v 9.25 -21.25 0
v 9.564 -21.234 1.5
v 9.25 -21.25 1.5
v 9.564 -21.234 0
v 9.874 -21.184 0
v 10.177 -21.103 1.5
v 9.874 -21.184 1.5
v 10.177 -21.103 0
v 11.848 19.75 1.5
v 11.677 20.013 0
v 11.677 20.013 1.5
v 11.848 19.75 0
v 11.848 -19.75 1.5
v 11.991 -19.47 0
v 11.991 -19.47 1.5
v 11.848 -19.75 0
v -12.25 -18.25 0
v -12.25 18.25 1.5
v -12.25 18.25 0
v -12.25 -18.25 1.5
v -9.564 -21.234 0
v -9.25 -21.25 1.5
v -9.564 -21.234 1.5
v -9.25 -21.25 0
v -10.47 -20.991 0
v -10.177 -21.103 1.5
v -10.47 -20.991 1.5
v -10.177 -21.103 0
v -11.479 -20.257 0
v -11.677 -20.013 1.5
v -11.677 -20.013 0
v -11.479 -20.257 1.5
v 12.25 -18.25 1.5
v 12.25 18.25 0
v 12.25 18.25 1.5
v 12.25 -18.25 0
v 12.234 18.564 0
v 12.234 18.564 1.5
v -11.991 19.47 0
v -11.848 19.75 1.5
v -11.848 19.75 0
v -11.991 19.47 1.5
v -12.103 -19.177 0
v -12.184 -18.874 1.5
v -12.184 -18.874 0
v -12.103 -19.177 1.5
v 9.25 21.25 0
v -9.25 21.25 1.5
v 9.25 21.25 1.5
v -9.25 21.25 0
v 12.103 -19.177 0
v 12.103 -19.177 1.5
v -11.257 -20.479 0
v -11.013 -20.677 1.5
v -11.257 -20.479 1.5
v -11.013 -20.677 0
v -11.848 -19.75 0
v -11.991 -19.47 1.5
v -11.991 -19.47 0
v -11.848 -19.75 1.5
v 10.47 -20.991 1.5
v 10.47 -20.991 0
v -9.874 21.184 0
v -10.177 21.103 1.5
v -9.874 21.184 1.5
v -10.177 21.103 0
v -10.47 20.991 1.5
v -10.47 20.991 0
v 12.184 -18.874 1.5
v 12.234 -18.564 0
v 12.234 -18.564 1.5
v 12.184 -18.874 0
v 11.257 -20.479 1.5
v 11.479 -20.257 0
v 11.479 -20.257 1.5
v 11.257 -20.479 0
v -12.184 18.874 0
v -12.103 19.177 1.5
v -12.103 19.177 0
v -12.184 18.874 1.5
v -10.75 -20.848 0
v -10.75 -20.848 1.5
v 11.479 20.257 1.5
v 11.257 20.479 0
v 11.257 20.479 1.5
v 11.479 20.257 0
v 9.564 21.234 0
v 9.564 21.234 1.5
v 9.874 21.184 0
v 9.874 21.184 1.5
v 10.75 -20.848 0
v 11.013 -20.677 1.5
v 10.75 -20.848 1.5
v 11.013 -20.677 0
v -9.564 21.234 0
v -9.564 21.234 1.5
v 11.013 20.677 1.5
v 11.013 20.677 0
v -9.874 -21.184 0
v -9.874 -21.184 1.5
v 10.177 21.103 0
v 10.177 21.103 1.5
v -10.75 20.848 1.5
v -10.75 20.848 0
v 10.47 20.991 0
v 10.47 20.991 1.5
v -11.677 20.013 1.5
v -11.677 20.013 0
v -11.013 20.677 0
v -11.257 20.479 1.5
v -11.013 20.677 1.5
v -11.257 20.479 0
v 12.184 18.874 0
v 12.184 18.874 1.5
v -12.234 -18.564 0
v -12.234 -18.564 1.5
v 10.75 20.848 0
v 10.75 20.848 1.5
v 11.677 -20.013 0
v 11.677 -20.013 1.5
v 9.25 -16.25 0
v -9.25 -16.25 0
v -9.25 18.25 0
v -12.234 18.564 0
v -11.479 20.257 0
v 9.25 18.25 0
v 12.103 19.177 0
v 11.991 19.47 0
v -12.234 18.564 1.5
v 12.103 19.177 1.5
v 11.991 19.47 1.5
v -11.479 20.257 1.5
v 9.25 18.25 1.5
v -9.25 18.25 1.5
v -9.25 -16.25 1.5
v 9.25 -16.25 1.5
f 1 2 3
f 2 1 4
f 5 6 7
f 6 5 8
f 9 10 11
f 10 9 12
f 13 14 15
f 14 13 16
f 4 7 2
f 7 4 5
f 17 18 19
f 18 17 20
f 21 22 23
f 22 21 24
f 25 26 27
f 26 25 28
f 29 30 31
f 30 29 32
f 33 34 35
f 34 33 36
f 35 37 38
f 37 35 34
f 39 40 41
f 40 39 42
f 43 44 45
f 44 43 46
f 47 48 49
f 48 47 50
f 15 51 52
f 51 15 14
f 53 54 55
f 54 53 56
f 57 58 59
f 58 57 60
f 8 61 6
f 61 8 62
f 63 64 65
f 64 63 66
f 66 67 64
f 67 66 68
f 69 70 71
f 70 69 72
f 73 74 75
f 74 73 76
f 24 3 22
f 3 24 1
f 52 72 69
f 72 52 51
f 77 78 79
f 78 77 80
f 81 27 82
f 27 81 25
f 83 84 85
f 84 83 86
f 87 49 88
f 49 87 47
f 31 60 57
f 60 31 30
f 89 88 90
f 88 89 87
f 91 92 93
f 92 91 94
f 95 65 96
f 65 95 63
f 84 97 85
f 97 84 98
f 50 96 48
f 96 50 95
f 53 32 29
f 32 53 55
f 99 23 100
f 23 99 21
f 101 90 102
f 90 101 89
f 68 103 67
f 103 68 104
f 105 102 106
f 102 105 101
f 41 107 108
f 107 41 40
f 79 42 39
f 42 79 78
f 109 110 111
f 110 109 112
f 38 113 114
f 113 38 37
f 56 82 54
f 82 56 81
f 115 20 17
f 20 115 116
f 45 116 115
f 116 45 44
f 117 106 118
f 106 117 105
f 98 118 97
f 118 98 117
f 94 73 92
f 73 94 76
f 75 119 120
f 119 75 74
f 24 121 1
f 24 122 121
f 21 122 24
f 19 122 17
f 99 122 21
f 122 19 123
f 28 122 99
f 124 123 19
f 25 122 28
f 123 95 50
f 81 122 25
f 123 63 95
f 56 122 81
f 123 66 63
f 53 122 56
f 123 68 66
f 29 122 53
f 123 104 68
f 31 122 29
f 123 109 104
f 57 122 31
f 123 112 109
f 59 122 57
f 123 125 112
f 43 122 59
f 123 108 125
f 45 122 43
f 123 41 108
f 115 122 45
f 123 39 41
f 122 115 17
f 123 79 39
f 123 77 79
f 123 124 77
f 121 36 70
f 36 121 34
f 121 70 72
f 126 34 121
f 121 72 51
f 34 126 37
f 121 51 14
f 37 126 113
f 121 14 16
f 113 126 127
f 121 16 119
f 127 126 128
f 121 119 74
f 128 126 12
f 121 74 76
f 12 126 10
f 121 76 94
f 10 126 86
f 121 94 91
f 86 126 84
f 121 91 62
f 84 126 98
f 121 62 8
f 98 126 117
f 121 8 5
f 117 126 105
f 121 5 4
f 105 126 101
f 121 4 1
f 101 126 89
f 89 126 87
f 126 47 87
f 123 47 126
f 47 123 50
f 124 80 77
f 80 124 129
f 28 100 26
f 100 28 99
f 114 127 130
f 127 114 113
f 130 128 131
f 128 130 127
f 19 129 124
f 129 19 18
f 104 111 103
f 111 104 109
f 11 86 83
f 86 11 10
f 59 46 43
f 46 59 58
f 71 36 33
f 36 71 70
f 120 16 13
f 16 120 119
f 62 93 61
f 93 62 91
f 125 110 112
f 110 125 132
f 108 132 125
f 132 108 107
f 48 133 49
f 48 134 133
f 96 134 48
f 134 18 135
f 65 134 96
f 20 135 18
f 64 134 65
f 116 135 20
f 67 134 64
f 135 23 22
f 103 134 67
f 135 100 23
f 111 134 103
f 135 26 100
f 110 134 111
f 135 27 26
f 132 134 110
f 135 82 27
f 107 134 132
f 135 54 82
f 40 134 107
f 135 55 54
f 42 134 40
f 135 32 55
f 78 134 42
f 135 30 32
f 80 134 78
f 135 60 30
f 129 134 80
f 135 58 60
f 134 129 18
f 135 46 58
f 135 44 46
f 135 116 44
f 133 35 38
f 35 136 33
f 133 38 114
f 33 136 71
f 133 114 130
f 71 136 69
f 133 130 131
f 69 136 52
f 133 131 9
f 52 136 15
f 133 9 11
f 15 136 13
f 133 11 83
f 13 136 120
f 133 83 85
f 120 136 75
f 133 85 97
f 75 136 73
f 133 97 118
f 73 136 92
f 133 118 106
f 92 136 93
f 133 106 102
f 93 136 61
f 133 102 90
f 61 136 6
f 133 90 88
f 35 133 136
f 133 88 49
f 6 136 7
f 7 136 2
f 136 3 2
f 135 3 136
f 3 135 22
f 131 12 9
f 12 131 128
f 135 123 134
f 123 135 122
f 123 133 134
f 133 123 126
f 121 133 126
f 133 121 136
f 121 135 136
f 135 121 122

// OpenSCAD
// --- Matching Asymmetrical Bezel ---
board_l = 37.0;    
board_w = 20.0;    
wall = 2.0;        
corner_r = 3.0; // Matches Case Enclosure

lcd_w = 18.5; 
lcd_l = 34.5;

// Outer dimensions to match the case face
case_face_w = board_w + (wall * 2) + 0.5; 
case_face_l = board_l + (wall * 2) + 1.5;

// Screen alignment offset: 3mm USB side vs 1mm other side
// This shifts the window relative to the outer frame
usb_offset = 1.0; 

$fn = 60;

difference() {
    // 1. Outer Frame (Matches Case Face exactly)
    linear_extrude(1.5)
        offset(r = corner_r) 
            square([case_face_w - 2*corner_r, case_face_l - 2*corner_r], center=true);
    
    // 2. Window Cutout (Shifted to create 3mm/1mm asymmetry)
    translate([0, usb_offset, -1])
        linear_extrude(4)
            square([lcd_w, lcd_l], center=true);
}
